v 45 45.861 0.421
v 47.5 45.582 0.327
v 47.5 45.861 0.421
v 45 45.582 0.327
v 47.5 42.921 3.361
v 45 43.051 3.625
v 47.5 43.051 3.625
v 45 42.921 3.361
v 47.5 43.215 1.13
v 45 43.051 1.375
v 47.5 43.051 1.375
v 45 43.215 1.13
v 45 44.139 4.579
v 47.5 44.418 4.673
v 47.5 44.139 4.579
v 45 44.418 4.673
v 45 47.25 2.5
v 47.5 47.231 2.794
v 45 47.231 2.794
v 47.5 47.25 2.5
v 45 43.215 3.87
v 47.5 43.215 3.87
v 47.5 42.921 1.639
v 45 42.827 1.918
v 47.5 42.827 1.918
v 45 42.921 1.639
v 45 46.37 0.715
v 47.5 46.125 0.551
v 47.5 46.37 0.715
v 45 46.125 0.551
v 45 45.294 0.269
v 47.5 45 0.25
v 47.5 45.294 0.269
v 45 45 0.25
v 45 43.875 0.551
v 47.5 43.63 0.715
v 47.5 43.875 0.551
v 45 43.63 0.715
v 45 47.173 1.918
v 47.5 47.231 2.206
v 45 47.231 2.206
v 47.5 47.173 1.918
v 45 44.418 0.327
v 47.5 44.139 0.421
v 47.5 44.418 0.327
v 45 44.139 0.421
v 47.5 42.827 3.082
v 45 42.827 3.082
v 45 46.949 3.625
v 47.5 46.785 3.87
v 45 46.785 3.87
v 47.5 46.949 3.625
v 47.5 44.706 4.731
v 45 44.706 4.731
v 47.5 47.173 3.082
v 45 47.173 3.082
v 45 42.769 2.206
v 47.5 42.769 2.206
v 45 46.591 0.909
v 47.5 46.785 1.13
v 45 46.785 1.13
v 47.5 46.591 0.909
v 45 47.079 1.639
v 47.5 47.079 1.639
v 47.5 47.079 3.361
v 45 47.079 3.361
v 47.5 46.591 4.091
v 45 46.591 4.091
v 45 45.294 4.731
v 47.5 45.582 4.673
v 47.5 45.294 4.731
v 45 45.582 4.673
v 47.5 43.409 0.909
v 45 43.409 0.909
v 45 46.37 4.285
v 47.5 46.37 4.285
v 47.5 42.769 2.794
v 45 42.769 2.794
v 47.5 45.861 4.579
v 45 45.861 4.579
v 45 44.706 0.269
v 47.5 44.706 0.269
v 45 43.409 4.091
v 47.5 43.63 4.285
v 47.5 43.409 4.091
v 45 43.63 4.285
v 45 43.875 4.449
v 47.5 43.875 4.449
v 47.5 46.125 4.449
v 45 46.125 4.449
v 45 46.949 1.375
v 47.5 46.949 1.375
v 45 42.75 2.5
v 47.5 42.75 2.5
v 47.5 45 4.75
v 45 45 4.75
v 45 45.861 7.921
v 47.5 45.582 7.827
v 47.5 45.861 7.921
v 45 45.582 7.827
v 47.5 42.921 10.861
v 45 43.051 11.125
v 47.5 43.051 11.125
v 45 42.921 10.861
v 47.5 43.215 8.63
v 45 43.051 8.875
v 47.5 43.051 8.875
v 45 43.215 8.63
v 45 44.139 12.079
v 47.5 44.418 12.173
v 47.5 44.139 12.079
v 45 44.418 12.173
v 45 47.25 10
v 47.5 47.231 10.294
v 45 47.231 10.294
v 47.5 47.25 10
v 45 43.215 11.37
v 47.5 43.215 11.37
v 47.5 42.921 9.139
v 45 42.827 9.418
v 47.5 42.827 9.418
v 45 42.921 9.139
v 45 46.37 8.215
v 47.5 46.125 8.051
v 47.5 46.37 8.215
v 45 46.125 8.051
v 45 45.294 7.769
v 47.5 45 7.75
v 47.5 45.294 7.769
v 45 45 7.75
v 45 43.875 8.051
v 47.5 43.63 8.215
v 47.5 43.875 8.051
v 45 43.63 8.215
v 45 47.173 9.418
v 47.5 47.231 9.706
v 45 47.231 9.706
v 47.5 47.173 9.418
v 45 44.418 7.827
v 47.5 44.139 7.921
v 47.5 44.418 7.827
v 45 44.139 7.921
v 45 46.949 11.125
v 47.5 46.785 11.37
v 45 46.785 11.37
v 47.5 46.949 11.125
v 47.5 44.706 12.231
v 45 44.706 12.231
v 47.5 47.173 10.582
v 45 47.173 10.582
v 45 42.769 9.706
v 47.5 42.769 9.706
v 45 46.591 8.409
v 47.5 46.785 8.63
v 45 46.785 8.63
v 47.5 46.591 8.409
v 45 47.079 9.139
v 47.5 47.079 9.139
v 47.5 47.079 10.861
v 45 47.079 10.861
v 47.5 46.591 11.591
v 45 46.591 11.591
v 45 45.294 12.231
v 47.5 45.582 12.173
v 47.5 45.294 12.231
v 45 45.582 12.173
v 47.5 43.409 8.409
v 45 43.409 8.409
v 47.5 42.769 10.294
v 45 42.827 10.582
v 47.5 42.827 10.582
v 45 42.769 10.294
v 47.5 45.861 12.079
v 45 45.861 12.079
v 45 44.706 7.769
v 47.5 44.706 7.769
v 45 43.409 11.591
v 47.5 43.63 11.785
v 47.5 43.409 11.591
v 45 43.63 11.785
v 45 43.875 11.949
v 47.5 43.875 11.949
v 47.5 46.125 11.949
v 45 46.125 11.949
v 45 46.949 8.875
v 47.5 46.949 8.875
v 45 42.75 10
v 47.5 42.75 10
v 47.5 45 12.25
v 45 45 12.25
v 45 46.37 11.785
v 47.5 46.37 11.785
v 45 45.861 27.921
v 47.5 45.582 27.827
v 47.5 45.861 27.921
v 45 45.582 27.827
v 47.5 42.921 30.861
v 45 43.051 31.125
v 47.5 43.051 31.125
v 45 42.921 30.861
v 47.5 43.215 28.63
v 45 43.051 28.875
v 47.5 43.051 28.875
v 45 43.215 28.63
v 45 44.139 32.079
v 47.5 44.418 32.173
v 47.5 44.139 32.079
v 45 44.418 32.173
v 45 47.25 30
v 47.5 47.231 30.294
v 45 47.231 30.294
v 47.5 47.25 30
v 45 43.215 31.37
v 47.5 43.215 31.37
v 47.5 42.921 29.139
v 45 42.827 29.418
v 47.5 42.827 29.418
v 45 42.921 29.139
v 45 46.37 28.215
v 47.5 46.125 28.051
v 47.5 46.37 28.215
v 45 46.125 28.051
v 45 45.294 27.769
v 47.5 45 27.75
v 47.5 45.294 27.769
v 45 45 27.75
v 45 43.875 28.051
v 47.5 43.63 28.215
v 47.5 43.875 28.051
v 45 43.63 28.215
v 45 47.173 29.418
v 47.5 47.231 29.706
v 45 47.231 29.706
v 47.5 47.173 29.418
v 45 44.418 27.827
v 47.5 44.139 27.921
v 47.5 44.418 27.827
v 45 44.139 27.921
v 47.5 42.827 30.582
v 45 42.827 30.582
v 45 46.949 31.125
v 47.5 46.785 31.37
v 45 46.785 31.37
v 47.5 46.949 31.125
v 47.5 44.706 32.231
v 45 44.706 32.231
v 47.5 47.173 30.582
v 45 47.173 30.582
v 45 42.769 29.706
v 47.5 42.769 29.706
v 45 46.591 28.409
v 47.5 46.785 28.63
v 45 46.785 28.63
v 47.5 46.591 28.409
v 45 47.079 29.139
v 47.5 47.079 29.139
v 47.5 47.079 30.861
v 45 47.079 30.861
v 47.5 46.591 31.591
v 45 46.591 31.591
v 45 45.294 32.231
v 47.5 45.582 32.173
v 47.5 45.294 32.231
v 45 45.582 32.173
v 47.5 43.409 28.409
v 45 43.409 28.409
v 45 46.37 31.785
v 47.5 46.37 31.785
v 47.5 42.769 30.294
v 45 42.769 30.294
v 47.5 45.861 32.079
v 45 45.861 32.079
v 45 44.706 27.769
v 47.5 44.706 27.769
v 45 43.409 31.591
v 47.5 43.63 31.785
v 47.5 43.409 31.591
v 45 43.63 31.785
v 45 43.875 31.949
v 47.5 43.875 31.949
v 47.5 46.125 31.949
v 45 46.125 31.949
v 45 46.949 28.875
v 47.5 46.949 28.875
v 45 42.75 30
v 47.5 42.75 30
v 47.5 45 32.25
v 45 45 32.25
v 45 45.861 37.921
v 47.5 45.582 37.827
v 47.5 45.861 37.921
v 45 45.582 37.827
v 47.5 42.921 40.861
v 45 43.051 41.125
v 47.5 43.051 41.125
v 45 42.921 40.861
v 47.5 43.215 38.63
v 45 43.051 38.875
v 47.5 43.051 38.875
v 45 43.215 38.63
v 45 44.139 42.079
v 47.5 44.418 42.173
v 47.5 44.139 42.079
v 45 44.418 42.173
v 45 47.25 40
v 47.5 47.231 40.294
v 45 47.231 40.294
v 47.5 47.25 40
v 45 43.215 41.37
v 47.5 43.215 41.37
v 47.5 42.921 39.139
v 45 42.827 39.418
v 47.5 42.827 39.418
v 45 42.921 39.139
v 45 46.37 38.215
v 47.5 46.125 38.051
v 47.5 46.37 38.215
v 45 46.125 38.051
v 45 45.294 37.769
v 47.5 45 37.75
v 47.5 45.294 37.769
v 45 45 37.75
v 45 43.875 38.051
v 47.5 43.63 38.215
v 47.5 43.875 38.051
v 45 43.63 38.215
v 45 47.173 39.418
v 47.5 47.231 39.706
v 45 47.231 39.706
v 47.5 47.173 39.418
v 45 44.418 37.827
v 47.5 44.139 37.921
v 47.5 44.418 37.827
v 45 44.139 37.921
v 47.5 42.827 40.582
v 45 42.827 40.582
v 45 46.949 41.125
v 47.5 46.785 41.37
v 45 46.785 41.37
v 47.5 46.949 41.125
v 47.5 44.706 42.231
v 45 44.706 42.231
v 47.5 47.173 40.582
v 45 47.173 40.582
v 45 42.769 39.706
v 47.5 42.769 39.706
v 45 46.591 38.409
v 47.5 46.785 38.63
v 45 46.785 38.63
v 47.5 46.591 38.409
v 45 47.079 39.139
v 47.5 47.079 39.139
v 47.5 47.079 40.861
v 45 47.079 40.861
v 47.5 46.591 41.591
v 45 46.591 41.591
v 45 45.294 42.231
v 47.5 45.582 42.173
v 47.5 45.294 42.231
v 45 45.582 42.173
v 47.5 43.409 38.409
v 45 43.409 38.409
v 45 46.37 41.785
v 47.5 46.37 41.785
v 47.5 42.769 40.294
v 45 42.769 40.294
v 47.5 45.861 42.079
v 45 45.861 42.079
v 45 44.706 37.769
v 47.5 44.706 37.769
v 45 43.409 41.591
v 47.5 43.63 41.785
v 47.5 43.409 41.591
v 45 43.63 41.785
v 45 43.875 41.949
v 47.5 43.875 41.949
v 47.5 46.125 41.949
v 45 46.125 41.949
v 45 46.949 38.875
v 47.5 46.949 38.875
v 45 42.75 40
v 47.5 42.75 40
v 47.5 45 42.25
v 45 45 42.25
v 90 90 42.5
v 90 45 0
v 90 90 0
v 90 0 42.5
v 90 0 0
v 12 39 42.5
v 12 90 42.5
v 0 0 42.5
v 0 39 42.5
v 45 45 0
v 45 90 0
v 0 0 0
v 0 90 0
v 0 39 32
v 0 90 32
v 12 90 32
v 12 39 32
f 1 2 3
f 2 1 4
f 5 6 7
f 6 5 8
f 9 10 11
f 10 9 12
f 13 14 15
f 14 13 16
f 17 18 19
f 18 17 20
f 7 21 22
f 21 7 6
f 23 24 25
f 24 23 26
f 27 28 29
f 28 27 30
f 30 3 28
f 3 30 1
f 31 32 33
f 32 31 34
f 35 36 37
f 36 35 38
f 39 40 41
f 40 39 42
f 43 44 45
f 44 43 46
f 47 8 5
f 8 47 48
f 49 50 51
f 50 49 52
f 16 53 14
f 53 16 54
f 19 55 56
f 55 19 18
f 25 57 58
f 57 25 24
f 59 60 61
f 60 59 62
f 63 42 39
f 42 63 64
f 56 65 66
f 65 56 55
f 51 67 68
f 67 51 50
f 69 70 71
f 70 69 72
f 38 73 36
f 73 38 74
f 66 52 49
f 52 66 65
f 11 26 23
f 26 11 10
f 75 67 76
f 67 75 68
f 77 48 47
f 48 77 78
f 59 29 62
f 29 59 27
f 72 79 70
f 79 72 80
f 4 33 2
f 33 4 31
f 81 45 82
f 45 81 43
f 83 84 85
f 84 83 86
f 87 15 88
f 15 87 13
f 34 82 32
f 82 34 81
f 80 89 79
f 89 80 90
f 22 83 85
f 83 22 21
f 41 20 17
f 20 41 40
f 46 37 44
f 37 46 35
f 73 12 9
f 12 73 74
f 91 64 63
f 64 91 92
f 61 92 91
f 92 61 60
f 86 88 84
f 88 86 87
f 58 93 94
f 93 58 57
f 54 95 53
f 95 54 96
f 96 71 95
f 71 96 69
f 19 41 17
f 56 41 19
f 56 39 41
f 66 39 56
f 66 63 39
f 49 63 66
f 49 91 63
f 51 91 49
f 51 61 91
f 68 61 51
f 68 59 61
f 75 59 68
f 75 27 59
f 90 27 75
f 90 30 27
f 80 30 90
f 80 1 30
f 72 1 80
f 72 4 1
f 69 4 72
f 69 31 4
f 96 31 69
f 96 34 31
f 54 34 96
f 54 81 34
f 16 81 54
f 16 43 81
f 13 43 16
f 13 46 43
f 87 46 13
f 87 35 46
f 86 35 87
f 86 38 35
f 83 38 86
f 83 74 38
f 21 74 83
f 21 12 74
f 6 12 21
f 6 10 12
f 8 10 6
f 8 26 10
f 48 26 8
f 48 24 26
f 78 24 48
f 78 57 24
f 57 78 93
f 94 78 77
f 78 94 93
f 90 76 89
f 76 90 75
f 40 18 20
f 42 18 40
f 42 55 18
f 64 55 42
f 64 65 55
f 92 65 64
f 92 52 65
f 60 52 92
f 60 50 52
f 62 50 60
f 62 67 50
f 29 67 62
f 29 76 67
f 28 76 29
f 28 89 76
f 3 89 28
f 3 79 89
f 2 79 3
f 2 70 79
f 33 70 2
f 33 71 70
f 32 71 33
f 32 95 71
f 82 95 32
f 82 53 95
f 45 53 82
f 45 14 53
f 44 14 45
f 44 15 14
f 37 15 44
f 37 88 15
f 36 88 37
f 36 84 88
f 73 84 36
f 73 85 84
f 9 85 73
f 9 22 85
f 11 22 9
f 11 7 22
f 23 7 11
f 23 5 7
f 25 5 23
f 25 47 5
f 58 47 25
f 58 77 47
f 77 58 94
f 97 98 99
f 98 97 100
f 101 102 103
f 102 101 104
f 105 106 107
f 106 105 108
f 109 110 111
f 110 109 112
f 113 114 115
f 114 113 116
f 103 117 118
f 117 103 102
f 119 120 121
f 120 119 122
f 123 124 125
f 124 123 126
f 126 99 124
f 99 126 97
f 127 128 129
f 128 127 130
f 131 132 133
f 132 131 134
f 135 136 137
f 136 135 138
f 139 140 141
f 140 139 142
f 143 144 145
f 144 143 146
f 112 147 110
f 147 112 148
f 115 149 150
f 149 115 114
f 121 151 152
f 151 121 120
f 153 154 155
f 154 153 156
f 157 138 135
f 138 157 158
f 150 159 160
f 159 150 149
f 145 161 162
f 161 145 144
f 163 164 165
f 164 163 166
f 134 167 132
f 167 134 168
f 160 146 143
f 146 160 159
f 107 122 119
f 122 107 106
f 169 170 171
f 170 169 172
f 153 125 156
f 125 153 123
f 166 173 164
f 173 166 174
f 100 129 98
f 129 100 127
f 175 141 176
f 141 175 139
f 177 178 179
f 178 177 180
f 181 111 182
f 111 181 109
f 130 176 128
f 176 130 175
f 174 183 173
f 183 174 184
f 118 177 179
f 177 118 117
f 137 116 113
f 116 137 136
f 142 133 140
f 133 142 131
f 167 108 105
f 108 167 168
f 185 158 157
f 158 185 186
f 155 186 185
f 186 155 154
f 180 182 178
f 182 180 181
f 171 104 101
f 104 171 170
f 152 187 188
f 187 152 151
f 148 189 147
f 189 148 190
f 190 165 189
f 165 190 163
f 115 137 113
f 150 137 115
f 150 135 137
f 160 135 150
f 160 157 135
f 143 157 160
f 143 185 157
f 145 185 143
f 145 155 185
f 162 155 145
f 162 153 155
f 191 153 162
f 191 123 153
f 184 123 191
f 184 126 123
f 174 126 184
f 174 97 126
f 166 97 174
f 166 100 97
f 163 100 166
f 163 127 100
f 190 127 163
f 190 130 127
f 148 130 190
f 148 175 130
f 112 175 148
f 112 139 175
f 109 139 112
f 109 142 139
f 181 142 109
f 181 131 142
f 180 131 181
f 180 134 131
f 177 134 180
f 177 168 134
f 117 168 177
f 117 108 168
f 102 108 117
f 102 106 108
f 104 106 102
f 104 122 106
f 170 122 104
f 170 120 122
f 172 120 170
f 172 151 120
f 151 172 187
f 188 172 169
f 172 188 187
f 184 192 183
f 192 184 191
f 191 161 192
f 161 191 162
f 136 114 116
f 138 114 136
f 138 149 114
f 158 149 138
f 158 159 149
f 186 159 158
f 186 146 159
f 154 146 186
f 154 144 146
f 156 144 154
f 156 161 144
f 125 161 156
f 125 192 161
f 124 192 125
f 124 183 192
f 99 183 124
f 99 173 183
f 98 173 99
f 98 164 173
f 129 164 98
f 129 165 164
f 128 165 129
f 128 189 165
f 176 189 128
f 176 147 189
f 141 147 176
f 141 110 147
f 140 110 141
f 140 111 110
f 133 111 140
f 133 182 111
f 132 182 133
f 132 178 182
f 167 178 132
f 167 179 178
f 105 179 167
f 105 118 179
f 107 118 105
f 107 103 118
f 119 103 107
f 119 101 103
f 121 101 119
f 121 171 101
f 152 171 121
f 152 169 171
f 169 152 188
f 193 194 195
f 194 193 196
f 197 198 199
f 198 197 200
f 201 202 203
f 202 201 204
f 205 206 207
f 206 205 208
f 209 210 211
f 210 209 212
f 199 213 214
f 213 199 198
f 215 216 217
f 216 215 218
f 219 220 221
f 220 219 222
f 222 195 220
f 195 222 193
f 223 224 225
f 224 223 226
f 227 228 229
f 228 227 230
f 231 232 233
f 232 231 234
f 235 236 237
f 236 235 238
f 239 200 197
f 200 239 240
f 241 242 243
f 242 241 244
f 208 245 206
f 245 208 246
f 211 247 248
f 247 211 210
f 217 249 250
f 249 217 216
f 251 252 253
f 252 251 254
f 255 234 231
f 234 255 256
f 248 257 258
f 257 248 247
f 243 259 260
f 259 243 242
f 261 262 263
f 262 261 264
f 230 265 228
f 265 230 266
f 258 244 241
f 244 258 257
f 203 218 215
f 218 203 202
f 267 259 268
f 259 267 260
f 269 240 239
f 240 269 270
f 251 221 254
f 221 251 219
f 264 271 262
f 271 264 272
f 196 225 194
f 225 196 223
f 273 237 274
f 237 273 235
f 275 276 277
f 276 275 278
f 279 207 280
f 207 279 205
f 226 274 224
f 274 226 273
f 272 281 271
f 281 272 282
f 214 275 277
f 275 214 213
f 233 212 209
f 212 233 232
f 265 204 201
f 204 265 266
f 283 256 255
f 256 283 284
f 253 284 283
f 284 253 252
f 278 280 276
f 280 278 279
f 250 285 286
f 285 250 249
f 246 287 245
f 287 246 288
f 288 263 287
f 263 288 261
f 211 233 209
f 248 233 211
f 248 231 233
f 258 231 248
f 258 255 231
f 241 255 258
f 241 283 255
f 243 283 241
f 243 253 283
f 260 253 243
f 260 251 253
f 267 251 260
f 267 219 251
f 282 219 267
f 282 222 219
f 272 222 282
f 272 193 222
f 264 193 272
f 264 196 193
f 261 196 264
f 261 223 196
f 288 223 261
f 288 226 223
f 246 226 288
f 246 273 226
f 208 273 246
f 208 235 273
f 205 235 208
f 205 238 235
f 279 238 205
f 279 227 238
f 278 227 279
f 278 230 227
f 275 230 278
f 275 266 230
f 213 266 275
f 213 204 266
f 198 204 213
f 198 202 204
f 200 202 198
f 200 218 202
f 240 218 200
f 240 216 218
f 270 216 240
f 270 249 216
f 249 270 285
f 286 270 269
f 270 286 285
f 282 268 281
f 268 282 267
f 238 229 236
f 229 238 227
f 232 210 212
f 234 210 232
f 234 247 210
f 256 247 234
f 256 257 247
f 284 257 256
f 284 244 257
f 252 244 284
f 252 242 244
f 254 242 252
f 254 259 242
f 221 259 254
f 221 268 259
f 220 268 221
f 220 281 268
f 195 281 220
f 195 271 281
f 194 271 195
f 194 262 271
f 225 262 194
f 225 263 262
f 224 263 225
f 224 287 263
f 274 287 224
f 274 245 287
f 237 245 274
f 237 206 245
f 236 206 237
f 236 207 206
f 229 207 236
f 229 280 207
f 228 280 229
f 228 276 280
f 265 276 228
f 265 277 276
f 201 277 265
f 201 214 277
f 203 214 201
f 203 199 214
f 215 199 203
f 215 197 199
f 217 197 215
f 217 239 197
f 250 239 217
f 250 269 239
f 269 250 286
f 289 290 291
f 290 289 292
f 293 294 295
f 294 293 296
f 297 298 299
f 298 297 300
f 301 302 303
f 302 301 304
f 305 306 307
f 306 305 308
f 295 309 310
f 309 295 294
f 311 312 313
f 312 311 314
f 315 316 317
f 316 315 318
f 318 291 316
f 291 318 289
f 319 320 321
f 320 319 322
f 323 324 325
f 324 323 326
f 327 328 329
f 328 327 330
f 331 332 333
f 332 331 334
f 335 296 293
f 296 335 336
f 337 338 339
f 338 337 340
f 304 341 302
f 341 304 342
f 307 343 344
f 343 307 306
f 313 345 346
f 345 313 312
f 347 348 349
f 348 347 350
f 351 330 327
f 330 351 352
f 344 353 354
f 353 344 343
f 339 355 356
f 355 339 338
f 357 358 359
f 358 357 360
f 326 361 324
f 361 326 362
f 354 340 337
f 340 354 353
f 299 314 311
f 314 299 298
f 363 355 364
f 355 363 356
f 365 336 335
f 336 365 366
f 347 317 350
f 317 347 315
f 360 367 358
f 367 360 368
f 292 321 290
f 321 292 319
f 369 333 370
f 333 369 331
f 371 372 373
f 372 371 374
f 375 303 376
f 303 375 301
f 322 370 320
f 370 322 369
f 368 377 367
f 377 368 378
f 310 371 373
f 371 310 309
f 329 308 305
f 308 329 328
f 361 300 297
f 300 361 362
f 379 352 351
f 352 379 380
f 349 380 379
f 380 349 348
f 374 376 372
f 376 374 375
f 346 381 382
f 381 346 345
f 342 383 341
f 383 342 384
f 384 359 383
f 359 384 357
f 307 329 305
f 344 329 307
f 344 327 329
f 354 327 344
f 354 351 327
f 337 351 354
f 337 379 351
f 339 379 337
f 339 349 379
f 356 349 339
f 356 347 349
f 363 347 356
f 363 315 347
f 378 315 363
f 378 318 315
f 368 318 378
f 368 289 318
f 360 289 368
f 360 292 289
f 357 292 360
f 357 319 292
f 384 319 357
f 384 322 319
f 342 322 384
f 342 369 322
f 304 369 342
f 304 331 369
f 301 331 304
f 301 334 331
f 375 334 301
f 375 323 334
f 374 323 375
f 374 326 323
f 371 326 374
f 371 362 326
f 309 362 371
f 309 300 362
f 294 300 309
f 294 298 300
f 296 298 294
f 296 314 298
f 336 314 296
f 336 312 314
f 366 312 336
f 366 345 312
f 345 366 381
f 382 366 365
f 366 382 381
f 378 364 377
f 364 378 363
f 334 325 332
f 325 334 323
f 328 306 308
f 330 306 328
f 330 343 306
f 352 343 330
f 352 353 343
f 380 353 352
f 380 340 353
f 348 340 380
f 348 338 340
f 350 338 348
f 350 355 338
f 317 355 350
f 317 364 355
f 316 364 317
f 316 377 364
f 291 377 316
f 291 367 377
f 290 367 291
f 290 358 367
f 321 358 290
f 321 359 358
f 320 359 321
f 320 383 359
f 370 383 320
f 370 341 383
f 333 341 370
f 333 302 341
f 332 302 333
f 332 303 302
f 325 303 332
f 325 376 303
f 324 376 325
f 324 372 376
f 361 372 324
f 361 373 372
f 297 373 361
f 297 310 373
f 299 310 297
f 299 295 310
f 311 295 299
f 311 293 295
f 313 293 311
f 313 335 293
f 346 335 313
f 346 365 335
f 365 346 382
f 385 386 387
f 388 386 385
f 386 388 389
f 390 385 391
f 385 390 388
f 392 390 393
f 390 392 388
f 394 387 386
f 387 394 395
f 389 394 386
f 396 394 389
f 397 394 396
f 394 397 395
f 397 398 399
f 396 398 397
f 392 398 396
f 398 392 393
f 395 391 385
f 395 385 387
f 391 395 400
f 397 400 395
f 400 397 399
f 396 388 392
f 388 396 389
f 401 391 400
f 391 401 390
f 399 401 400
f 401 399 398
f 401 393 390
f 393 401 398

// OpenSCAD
// Magnetic stirrer housing - an open box (top open) that mounts over a PC case fan to enclose
// the blades while allowing the shaft to pass through. The open top is the stirring surface. NOVEL
// general part.
//

top     = 90;
length  = 90;
height  = 40;
wall    = 2.5;
screw   = 4.5;
cable   = 12;

$fn = 48;

difference() {
    cube([top, length, height + wall]);
    translate([top * 0.5, length * 0.5, -1]) cube([top, length, 1]);                 // open top
    for (z = [wall, height * 0.25, height * 0.75, height])
        translate([top / 2, length / 2, z]) rotate([0, 90, 0]) cylinder(h = wall, d = screw);   // screw holes
    translate([0, length / 2 - cable / 2, height - 8]) cube([cable, length, wall + 8]);           // cable notch in one wall
}
